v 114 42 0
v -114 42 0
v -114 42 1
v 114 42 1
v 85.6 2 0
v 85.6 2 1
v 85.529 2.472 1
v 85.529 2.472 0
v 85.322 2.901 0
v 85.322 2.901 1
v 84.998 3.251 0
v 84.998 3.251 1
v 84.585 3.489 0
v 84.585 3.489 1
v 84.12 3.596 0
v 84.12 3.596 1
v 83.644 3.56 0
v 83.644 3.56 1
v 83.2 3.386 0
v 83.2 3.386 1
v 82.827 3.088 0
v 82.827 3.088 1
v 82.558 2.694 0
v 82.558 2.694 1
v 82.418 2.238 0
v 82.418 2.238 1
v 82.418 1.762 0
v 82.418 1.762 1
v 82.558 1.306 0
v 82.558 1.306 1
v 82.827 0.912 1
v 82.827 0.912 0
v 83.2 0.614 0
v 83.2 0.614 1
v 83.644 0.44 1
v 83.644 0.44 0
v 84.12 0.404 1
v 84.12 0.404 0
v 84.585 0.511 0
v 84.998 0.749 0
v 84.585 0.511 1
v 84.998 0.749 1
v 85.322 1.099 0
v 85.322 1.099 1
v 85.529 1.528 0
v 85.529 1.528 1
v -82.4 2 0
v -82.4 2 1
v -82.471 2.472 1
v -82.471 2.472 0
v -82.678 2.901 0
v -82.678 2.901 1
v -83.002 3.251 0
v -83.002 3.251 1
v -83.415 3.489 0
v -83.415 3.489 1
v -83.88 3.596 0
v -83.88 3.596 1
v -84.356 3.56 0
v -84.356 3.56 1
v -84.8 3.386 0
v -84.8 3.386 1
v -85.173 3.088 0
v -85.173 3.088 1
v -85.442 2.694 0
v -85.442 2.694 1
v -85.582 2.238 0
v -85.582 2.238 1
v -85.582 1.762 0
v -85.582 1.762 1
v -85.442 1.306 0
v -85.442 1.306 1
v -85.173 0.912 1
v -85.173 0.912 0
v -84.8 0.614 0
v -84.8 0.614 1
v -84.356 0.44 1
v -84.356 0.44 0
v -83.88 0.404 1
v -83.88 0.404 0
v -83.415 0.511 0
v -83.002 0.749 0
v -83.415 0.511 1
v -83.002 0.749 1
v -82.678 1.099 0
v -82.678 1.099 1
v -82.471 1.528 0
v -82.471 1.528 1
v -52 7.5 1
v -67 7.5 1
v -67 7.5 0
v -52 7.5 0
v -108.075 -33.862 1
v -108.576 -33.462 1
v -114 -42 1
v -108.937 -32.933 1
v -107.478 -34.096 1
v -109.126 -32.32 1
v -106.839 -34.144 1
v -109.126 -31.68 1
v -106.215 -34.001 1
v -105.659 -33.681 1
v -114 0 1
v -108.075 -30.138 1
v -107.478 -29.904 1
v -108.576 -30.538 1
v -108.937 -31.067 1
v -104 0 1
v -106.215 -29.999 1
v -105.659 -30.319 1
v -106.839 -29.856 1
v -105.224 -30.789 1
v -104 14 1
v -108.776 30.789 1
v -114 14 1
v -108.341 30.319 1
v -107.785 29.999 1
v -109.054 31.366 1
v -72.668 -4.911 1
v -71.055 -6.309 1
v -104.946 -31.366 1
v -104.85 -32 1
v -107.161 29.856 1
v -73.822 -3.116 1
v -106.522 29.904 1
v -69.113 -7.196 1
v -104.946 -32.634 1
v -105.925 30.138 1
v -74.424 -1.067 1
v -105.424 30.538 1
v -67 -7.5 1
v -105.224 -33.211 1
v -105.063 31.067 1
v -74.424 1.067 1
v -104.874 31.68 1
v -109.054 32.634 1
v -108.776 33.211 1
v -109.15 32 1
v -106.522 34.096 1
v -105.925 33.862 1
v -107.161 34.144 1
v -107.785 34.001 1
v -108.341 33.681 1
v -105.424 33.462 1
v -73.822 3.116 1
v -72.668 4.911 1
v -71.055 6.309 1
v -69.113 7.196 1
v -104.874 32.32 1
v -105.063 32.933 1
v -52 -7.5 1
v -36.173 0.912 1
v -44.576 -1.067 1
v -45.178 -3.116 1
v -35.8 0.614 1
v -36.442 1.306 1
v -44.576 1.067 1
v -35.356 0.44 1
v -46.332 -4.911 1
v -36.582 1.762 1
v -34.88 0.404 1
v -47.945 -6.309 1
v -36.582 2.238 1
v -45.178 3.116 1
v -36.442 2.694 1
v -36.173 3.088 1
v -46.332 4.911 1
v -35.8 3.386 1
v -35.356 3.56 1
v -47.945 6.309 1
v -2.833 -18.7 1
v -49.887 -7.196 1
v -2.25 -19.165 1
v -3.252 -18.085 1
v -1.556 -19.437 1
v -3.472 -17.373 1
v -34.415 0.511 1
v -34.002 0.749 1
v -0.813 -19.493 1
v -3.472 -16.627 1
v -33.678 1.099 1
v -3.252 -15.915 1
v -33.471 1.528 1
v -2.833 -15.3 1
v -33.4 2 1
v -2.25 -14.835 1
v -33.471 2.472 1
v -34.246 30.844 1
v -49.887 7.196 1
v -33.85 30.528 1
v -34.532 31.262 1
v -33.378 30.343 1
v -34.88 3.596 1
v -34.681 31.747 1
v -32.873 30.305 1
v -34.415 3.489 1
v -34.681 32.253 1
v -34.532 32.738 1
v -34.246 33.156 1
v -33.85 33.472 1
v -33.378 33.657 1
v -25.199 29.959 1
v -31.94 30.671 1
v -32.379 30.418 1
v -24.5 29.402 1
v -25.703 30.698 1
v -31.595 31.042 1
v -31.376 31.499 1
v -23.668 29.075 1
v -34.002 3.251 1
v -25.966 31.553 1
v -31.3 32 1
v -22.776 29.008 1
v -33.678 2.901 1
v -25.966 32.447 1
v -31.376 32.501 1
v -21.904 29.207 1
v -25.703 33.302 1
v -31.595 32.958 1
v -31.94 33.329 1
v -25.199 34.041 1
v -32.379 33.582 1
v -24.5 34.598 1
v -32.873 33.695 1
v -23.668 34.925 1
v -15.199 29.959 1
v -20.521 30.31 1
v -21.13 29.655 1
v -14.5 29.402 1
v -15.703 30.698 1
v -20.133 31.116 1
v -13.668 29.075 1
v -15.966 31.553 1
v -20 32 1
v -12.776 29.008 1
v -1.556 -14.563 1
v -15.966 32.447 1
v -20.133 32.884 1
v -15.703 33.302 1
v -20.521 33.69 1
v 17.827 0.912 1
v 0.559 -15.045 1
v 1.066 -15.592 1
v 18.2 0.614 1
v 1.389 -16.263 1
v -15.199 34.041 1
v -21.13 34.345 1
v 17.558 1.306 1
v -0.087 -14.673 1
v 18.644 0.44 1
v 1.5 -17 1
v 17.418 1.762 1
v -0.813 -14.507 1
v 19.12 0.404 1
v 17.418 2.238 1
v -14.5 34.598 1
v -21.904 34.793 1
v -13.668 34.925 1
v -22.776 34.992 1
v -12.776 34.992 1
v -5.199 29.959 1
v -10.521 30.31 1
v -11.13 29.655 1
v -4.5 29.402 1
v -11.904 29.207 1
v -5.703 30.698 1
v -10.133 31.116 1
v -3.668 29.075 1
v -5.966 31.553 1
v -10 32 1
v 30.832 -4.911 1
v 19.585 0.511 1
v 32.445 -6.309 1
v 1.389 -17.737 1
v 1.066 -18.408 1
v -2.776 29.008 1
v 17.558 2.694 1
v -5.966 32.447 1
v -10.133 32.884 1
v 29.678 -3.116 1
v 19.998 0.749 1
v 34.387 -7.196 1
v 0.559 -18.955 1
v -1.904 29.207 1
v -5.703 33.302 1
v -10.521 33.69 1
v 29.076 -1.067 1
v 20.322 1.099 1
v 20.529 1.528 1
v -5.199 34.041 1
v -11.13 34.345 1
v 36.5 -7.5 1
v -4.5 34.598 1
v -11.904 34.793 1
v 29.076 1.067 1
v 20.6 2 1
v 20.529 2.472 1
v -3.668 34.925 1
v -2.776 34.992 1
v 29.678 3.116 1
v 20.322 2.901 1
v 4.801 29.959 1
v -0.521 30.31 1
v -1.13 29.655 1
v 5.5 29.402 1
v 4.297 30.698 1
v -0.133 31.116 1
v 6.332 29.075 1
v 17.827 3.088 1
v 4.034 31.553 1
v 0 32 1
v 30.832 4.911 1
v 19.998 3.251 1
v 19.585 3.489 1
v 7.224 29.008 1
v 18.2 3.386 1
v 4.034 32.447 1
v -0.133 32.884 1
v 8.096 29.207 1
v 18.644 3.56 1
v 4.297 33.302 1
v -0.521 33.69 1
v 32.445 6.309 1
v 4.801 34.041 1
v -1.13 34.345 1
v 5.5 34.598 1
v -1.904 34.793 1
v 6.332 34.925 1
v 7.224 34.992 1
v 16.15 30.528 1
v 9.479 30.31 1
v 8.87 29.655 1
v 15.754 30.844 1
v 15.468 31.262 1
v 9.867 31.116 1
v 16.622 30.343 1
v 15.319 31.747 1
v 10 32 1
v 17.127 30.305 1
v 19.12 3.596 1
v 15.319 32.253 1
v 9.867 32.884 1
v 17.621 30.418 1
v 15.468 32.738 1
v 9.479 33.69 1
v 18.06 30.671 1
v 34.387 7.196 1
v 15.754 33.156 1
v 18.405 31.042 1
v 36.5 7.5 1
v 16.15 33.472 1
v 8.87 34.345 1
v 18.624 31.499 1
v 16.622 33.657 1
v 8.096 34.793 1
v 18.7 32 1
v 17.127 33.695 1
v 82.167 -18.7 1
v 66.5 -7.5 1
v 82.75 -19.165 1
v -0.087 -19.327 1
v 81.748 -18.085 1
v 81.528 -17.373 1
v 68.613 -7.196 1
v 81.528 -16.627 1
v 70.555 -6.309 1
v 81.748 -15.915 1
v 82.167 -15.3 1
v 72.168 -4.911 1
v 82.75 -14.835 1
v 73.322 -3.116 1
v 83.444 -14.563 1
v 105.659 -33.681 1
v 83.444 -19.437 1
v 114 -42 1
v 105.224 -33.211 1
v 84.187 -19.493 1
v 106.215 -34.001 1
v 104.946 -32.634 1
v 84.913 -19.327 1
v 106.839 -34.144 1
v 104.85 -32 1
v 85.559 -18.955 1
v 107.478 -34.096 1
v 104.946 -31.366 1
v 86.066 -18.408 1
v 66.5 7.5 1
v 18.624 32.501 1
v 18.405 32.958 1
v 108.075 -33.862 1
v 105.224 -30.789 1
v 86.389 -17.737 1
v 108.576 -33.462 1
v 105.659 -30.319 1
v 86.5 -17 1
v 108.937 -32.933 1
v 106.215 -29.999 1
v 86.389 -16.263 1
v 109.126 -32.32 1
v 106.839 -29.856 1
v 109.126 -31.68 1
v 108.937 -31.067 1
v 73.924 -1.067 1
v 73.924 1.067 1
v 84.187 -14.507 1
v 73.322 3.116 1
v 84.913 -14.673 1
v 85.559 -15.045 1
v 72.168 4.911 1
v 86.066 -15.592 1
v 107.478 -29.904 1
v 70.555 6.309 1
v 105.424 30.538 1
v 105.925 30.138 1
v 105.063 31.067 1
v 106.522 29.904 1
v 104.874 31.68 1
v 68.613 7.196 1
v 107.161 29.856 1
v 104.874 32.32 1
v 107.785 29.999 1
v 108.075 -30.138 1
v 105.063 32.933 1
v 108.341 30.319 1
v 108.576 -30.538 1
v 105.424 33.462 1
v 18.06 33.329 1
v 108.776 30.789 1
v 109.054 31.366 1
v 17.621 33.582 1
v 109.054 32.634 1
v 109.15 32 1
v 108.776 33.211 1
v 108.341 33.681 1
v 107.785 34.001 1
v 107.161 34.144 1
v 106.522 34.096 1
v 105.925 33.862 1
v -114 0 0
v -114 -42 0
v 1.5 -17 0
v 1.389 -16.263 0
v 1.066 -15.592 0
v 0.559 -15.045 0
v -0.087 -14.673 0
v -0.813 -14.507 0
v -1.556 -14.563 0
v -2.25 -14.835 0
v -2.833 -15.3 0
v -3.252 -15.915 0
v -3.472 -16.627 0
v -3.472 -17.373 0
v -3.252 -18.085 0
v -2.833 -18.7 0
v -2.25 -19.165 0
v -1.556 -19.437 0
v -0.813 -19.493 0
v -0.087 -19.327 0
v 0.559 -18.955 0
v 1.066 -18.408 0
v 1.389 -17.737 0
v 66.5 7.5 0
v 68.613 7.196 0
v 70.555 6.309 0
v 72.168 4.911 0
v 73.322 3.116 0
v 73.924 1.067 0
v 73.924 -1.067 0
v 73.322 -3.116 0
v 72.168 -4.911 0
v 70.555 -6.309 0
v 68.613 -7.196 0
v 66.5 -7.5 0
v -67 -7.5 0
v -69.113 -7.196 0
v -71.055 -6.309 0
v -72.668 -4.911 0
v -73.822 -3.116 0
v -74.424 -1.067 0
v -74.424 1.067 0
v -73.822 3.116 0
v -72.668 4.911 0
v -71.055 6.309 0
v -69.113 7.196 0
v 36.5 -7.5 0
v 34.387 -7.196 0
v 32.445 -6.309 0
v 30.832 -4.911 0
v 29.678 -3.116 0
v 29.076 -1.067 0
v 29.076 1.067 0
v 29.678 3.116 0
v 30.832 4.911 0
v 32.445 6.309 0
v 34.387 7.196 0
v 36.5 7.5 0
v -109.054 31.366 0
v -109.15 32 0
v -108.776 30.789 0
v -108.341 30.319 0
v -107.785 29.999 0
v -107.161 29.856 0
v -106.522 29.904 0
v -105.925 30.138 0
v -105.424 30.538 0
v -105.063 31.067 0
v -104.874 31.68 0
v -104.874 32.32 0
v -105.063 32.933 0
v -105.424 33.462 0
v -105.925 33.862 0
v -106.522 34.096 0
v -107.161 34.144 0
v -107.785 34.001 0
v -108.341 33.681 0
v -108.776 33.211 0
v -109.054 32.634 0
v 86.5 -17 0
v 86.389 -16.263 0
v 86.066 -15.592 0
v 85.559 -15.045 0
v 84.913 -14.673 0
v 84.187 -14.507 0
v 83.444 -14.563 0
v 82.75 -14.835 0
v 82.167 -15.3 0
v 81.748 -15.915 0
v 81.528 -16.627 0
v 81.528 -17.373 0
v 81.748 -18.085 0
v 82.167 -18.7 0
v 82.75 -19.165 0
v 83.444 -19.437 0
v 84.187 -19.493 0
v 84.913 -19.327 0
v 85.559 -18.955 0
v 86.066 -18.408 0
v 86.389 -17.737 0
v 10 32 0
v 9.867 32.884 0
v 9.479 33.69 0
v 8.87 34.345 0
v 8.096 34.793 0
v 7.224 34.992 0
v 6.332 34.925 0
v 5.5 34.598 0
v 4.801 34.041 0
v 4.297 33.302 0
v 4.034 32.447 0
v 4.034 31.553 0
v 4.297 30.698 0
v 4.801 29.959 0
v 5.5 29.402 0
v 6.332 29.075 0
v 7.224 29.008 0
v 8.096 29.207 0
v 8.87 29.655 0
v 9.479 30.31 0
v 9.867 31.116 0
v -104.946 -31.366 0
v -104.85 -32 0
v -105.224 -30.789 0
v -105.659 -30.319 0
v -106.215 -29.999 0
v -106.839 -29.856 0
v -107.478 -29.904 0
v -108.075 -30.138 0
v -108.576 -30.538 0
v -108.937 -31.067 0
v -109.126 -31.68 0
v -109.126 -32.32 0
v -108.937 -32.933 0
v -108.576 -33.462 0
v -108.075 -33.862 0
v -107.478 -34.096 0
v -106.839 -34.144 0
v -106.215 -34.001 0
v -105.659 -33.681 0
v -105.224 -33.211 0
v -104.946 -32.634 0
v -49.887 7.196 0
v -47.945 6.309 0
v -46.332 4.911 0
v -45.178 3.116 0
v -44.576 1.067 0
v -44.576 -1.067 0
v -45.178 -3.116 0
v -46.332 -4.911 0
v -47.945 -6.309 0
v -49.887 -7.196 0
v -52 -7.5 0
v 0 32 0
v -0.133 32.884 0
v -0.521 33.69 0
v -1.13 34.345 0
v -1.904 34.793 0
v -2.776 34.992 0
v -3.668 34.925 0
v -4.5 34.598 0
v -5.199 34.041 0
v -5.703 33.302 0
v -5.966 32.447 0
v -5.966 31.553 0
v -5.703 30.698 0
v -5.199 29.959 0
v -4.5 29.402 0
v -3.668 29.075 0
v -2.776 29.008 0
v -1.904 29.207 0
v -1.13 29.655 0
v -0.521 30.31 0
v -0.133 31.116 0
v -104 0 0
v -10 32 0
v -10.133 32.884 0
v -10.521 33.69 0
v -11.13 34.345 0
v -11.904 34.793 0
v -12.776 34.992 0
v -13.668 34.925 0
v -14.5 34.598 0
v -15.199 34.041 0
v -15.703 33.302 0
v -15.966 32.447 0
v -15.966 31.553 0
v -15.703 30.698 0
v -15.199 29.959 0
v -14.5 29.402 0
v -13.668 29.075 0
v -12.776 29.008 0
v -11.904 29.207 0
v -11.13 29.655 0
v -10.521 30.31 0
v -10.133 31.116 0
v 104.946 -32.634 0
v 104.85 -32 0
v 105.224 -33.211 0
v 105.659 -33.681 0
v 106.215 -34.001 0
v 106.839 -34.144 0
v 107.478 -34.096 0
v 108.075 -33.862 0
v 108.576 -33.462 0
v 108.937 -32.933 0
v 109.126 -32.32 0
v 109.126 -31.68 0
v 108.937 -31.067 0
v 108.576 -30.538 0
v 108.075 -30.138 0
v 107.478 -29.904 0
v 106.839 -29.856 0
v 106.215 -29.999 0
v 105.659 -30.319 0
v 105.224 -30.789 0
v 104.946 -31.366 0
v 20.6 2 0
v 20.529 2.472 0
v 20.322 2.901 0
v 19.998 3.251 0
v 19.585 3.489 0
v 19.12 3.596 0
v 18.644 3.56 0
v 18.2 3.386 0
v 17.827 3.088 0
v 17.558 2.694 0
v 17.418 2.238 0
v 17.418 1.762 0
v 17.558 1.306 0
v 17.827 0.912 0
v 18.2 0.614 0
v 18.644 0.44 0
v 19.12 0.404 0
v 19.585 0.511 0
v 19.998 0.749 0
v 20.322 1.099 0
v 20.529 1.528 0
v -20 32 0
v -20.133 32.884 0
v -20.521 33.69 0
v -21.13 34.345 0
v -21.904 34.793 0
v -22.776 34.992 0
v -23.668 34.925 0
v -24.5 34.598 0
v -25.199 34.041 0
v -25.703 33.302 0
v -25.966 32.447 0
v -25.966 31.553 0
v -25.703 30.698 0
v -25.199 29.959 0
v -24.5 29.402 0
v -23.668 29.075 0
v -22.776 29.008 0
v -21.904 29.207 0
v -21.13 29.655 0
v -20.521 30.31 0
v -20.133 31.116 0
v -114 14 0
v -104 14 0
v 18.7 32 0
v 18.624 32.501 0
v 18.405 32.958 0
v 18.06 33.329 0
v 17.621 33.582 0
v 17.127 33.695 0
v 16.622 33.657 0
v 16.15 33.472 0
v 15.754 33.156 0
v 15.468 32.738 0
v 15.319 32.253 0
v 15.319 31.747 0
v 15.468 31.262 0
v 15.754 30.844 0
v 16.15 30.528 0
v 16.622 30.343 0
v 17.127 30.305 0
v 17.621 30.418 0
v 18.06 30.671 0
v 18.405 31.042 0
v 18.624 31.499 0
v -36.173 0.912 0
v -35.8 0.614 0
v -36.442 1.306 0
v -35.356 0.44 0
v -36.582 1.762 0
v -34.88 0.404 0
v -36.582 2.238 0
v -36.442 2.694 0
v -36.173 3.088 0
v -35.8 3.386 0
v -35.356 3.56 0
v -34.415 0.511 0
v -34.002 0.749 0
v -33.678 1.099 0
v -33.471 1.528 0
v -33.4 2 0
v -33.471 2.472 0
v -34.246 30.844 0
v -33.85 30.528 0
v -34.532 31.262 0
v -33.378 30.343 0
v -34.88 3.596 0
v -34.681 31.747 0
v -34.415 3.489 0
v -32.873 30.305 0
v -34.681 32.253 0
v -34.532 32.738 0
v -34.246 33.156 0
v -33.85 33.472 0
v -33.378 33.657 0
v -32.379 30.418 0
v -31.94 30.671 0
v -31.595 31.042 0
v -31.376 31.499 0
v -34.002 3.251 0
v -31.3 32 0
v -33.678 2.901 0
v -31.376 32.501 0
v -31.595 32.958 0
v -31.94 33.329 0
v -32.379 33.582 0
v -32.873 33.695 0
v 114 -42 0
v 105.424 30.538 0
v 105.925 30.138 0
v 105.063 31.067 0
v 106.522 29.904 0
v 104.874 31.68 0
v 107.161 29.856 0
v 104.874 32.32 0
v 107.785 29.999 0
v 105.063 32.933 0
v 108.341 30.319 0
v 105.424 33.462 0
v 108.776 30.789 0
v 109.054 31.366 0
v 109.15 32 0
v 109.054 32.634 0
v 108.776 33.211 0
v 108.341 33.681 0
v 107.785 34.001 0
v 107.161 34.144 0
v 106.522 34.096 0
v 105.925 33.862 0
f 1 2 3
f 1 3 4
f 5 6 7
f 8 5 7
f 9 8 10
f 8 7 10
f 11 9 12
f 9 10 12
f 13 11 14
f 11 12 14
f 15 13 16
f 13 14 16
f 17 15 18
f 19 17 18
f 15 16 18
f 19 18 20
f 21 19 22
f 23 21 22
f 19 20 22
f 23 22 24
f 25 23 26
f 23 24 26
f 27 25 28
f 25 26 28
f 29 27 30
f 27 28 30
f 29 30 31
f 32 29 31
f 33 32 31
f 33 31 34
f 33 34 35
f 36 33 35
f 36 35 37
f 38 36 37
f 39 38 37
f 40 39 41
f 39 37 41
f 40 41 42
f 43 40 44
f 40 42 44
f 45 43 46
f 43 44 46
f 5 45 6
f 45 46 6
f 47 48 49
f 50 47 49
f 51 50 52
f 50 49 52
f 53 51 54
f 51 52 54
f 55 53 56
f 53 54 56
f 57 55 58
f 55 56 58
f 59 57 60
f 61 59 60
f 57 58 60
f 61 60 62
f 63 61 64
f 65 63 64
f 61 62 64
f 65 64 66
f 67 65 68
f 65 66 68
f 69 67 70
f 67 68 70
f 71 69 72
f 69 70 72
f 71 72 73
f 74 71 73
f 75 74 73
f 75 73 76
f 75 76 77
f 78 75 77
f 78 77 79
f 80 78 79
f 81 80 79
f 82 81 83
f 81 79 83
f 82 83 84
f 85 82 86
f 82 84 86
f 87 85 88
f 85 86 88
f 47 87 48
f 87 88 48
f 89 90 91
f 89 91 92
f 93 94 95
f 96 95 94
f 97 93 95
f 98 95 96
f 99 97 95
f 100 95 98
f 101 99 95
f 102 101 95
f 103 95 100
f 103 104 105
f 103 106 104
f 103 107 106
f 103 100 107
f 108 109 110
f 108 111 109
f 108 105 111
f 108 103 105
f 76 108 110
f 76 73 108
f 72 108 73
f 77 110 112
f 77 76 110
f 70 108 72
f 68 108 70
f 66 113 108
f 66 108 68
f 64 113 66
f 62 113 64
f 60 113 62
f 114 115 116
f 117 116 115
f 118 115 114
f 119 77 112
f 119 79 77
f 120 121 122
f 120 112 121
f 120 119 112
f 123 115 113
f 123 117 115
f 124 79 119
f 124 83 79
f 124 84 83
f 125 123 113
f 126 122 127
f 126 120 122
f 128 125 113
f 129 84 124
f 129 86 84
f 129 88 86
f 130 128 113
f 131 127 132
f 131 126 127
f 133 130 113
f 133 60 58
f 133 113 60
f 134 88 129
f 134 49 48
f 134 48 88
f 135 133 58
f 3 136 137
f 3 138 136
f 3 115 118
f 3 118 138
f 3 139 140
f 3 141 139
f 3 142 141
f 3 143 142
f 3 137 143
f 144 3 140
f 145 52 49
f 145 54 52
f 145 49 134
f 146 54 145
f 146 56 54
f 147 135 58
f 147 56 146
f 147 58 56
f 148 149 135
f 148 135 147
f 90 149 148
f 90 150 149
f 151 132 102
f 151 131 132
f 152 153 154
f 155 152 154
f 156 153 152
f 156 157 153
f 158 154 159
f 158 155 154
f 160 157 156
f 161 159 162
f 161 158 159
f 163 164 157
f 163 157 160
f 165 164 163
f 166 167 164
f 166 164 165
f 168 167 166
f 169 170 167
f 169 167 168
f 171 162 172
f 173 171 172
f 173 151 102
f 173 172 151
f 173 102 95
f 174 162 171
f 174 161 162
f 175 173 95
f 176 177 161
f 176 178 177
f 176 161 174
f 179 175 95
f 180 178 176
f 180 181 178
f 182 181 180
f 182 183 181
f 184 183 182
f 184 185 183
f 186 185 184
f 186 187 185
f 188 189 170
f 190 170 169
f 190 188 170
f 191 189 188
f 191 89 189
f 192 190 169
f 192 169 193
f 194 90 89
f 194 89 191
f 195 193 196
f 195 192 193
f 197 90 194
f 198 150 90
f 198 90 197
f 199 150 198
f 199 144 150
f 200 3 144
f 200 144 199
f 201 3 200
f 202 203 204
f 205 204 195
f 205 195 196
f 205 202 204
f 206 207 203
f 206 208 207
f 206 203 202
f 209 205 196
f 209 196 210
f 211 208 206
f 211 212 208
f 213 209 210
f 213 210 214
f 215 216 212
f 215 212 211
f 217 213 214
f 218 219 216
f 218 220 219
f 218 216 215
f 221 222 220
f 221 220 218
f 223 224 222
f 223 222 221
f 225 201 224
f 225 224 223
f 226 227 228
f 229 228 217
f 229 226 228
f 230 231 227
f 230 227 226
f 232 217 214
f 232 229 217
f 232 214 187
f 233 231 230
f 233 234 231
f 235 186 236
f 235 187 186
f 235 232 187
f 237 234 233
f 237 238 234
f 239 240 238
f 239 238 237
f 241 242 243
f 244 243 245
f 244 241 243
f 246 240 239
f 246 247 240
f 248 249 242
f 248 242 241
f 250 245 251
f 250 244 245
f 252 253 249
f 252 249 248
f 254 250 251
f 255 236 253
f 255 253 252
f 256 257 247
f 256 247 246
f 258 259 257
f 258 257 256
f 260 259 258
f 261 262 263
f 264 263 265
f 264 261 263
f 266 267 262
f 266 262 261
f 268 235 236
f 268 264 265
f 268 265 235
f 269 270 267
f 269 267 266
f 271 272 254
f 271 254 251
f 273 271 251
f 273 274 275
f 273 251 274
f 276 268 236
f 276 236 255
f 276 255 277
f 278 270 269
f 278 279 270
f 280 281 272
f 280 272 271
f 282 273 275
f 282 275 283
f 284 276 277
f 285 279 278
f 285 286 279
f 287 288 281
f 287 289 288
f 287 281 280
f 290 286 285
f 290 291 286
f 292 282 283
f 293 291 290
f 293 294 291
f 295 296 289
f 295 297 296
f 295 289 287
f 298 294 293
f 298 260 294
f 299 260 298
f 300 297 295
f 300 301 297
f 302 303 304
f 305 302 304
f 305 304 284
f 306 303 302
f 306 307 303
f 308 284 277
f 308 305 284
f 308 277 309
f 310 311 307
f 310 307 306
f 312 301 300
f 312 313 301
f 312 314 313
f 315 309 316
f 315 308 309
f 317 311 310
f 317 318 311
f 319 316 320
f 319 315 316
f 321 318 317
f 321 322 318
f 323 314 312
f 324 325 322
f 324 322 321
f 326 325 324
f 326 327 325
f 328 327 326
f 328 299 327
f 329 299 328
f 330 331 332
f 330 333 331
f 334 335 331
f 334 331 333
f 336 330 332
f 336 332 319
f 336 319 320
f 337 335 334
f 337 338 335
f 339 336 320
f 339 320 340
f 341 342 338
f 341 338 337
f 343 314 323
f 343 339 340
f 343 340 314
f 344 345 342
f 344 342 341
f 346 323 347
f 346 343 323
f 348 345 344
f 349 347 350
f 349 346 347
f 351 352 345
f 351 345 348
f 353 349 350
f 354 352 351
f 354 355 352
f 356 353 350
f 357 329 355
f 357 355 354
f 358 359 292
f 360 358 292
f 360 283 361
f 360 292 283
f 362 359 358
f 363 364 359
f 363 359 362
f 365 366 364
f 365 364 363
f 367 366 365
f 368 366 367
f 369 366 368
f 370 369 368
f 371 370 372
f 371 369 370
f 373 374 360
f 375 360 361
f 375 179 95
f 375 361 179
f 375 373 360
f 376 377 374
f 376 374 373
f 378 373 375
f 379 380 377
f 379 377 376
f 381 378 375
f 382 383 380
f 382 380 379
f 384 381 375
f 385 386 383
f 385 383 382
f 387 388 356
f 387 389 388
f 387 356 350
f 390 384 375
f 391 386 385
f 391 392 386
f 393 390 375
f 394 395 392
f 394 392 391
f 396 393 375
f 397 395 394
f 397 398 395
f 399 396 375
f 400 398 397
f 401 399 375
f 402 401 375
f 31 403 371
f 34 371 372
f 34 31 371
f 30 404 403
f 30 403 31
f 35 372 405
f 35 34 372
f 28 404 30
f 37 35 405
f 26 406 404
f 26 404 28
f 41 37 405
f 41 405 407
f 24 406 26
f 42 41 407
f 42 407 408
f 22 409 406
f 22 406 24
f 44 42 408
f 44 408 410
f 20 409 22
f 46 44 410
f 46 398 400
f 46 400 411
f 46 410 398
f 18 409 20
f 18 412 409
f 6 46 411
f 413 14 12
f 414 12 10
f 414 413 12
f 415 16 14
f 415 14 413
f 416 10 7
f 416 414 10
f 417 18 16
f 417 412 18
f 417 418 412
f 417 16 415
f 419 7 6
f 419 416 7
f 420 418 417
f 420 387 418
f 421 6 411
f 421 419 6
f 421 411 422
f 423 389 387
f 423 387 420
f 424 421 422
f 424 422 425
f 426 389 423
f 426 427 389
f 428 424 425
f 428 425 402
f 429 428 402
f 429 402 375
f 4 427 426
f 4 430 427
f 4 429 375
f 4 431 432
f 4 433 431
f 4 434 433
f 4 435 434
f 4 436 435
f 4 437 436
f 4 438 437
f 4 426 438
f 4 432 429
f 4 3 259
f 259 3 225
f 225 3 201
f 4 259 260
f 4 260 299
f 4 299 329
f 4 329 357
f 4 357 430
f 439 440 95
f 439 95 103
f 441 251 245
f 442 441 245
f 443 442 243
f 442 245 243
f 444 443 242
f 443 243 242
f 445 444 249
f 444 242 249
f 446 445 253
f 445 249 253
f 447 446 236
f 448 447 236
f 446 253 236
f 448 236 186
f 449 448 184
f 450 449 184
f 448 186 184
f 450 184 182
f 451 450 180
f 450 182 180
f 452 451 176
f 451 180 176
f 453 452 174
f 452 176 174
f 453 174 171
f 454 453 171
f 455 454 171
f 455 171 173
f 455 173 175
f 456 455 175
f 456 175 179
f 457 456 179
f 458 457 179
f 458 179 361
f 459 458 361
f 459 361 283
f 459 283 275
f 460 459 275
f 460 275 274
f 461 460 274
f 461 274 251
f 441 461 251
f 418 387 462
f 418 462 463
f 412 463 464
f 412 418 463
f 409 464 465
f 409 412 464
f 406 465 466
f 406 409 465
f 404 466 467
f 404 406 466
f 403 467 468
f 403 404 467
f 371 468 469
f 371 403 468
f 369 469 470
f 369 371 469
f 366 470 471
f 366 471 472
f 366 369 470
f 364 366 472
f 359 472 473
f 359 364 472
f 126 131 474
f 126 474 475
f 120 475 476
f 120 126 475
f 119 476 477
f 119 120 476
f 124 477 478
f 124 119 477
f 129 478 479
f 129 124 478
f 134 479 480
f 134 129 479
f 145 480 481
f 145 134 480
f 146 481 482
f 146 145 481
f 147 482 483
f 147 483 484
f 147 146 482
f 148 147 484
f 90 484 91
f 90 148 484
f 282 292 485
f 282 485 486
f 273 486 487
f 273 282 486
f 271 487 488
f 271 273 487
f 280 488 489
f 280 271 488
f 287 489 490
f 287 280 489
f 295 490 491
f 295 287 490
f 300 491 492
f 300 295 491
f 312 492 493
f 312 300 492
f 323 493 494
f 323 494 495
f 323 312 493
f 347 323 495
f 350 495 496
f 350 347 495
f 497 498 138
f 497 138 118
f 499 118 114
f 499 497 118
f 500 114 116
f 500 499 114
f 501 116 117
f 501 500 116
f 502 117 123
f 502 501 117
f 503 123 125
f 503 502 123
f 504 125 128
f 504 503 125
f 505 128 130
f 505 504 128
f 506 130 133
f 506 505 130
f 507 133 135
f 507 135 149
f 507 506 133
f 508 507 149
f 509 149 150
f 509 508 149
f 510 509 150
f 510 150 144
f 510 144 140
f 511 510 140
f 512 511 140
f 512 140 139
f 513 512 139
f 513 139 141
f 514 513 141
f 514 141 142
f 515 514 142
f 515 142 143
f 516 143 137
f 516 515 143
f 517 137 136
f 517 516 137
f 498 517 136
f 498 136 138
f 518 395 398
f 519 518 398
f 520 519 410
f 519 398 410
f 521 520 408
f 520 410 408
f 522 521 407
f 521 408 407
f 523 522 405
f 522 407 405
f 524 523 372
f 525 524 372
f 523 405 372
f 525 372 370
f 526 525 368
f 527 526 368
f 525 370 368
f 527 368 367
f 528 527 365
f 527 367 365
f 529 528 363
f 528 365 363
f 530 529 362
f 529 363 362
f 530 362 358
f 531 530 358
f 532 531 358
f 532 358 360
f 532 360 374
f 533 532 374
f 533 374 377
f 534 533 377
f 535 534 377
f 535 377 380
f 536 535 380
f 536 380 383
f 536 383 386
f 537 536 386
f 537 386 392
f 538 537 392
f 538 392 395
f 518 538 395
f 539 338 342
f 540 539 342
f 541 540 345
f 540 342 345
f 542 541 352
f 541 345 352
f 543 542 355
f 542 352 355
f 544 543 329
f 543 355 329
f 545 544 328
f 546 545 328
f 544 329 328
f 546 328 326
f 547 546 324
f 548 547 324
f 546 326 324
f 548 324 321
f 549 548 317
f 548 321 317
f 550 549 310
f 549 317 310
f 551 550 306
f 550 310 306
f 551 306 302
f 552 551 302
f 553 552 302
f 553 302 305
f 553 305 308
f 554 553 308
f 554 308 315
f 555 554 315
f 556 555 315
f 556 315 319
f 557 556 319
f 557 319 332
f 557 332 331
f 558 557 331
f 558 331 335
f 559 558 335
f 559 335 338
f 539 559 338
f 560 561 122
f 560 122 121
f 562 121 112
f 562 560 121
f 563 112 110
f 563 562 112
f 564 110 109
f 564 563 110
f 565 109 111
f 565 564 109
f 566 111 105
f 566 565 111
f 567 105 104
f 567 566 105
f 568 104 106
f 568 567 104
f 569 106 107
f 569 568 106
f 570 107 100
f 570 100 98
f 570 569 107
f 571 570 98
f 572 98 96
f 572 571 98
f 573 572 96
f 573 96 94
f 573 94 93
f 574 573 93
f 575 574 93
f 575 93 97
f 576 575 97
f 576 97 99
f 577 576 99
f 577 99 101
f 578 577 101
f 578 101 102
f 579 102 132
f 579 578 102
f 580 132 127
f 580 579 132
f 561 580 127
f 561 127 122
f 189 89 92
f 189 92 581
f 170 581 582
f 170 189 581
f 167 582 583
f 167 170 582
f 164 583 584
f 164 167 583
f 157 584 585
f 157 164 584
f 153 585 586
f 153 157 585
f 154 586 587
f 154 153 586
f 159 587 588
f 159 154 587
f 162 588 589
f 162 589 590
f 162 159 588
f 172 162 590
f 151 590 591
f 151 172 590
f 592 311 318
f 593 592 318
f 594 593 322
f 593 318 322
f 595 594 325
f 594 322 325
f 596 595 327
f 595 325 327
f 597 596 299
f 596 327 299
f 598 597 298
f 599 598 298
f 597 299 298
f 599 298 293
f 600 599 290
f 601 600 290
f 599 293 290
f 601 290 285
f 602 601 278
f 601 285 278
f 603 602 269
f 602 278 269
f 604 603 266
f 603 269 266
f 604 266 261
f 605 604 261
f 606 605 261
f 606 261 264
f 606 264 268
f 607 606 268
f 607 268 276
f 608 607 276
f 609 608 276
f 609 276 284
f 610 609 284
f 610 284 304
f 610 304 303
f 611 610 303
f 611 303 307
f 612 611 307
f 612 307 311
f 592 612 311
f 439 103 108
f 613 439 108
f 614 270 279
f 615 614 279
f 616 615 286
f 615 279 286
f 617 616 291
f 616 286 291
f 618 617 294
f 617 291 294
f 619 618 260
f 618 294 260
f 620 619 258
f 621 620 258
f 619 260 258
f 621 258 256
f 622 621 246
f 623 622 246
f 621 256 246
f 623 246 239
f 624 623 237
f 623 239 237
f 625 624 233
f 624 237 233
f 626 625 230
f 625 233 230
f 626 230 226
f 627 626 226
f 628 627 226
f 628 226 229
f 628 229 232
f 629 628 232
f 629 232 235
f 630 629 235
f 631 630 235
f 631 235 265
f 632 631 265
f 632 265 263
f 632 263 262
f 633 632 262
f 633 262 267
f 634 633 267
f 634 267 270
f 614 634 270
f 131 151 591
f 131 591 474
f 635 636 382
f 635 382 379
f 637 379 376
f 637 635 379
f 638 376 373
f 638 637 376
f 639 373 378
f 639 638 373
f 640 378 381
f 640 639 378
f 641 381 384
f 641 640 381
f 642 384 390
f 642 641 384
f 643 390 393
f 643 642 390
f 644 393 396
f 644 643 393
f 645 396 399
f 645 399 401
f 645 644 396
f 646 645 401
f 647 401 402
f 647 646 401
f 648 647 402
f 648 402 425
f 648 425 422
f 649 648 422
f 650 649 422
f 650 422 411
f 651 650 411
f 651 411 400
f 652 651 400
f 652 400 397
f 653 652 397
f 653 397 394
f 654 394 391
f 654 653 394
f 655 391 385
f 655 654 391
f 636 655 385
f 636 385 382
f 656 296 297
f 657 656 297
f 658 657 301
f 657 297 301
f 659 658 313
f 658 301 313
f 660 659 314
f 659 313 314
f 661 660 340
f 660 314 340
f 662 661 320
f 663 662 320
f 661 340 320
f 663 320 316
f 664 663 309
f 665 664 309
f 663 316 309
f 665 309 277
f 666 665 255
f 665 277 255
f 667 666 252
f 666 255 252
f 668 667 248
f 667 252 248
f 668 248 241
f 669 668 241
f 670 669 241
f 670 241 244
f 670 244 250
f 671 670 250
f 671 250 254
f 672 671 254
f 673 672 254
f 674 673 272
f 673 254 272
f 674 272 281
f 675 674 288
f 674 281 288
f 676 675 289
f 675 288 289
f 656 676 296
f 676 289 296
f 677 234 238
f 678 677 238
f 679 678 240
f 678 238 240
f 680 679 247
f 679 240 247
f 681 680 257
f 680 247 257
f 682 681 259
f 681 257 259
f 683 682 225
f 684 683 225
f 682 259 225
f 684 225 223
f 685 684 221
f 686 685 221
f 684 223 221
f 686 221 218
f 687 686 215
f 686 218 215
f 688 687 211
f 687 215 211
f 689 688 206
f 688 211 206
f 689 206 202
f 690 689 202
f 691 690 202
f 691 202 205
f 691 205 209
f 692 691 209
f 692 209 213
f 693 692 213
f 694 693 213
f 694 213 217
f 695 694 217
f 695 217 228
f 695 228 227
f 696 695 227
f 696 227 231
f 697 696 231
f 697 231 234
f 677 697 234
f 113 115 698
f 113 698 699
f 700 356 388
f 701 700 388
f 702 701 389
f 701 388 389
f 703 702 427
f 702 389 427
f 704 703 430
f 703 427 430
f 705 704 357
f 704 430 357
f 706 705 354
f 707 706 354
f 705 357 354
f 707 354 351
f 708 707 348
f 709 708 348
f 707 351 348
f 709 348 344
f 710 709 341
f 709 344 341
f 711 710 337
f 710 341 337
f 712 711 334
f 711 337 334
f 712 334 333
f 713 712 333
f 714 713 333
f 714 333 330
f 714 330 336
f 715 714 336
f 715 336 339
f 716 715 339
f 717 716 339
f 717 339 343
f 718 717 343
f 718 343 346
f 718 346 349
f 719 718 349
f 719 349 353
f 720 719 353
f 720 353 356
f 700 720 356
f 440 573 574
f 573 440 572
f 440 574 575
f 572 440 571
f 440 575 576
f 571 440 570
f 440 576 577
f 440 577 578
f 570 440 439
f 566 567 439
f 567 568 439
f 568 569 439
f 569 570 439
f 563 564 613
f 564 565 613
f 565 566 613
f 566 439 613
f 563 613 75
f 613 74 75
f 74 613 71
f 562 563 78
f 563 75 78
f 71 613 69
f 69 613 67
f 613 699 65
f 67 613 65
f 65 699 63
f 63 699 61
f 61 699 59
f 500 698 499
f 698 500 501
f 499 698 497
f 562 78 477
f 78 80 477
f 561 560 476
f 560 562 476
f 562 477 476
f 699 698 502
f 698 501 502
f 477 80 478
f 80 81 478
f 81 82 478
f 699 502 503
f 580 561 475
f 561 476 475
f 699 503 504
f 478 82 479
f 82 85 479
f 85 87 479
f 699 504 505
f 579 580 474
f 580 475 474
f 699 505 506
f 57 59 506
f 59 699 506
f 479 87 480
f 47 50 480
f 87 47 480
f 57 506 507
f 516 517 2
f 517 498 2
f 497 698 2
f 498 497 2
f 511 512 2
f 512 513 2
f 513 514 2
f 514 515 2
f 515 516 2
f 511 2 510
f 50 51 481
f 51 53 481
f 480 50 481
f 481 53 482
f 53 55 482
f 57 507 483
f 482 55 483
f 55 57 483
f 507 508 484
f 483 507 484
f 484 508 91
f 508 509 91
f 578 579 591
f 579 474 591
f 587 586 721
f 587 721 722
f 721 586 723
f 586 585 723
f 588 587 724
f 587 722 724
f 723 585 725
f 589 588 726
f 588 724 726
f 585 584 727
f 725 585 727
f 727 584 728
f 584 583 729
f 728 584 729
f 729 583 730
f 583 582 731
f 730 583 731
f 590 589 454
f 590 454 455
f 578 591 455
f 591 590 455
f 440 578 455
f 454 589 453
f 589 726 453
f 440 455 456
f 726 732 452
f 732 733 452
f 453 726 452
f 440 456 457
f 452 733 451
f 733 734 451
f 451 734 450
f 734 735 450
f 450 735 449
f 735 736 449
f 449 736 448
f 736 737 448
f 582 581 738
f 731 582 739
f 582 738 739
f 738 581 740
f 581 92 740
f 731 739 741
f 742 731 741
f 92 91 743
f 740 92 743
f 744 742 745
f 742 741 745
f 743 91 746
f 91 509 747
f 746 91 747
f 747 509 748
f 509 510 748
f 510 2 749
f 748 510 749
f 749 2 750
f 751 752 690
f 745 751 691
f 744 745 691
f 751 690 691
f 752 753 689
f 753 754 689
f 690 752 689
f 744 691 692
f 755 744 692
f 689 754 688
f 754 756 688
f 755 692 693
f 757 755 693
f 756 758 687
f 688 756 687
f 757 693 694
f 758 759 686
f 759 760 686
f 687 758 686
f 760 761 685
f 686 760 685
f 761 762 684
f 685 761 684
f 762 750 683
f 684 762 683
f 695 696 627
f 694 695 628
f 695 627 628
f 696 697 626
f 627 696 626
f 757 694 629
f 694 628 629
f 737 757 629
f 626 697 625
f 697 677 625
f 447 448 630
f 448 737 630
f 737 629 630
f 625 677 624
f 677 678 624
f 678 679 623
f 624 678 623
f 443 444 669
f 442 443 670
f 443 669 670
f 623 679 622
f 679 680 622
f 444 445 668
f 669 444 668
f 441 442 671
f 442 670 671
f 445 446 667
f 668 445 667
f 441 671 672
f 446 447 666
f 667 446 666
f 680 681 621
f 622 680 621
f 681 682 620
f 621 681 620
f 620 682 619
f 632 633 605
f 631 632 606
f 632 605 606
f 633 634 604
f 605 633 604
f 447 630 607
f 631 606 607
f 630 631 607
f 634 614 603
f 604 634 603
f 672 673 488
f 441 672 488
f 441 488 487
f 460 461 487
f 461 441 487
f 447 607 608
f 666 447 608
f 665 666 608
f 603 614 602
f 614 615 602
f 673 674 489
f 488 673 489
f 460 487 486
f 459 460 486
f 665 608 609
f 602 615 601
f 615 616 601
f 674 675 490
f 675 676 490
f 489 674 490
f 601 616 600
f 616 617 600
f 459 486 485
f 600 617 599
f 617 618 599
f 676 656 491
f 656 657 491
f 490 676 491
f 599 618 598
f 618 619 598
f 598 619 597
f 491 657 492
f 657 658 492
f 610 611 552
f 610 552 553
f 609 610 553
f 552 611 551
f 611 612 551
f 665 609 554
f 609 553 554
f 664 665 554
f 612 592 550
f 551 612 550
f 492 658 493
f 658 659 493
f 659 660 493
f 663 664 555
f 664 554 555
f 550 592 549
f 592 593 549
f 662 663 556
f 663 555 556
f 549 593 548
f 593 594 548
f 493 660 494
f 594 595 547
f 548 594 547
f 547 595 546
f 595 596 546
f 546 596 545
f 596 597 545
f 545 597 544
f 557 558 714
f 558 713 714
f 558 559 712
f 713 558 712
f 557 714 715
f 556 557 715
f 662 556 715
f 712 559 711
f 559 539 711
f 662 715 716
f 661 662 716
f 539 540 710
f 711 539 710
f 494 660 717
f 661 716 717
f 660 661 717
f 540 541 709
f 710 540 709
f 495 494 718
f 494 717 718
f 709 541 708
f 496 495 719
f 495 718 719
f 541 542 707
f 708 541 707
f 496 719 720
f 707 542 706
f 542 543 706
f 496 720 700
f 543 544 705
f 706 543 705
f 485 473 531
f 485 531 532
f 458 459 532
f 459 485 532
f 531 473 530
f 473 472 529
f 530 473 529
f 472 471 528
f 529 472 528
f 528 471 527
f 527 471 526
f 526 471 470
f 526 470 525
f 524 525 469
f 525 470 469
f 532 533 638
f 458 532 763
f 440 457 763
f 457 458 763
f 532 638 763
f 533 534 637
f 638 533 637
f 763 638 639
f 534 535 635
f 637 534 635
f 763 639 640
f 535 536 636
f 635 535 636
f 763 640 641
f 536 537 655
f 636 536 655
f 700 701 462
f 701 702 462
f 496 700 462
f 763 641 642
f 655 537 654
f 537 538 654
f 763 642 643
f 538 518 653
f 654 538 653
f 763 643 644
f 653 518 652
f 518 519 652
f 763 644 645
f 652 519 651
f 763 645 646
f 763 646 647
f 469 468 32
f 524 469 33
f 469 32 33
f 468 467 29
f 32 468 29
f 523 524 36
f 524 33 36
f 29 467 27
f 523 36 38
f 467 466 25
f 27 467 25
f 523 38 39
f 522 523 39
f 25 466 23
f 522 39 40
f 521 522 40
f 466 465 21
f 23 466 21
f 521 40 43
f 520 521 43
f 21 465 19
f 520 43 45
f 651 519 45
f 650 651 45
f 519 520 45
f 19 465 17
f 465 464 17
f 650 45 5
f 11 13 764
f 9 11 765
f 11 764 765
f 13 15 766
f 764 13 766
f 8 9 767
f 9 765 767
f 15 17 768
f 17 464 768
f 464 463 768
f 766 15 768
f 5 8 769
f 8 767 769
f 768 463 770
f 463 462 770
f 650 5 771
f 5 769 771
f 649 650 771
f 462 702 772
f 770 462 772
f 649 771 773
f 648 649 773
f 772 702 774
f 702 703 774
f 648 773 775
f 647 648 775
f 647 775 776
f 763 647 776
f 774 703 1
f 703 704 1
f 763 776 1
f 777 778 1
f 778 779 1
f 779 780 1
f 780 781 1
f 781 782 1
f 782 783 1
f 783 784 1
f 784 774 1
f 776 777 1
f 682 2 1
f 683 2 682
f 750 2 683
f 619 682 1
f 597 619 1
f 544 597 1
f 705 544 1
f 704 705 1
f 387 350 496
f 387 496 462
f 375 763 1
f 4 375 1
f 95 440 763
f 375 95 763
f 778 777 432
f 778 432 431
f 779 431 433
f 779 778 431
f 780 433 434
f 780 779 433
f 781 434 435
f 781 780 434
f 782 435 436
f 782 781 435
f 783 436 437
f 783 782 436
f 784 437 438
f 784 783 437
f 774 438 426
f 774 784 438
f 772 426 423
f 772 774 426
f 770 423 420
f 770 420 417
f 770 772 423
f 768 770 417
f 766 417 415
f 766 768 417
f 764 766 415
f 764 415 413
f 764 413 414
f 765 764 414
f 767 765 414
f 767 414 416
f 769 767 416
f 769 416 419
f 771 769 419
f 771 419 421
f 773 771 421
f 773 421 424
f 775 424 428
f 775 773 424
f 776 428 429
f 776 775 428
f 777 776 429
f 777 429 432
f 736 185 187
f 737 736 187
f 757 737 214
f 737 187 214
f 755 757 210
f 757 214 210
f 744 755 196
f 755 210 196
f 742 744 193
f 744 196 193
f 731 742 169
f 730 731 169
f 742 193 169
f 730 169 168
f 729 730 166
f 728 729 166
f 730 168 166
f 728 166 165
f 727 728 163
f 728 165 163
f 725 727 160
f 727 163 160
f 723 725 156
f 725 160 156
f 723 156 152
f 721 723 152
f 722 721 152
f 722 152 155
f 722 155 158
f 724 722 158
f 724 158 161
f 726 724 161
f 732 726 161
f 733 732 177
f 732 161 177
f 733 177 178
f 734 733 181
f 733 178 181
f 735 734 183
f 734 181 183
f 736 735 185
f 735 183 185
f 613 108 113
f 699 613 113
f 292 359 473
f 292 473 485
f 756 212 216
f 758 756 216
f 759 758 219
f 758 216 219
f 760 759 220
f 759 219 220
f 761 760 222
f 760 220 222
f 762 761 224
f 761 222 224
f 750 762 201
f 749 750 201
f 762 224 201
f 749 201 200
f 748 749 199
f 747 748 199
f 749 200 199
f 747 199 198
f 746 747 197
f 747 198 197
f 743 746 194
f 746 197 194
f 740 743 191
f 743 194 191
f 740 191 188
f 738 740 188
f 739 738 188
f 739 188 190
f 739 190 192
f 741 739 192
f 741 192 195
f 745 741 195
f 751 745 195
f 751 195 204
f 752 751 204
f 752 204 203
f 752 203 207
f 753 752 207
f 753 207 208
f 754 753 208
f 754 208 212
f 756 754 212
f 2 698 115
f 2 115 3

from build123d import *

# Parameters (mm, degrees)
SKETCH_1_W          = 228
SKETCH_1_H          = 84
SKETCH_1_R          = 2.15
EXTRUDE_1_DEPTH     = 1
SKETCH_4_R          = 1.6
SKETCH_4_W          = 14.464145402
SKETCH_4_H          = 14
CUT_EXTRUDE_2_DEPTH = 1
SKETCH_5_R          = 1.7
SKETCH_5_R_2        = 3
SKETCH_5_R_3        = 2.5
CUT_EXTRUDE_3_DEPTH = 10


with BuildPart() as part:
    # Эскиз1 → Вытянуть1 (new body)
    with BuildSketch(Plane.XY):
        Rectangle(SKETCH_1_W, SKETCH_1_H)
        with Locations((107, 32)):
            Circle(SKETCH_1_R, mode=Mode.SUBTRACT)
        with Locations(Location((-107, 32, 0), (0, 0, 180))):
            Circle(SKETCH_1_R, mode=Mode.SUBTRACT)
        with Locations((-107, -32)):
            Circle(SKETCH_1_R, mode=Mode.SUBTRACT)
        with Locations(Location((107, -32, 0), (0, 0, 180))):
            Circle(SKETCH_1_R, mode=Mode.SUBTRACT)
    extrude(amount=EXTRUDE_1_DEPTH)

    # Эскиз4 → Вырез-Вытянуть2 (cut)
    with BuildSketch(Plane.XY.offset(1)):
        with Locations((19, 2)):
            Circle(SKETCH_4_R)
        with Locations((84, 2)):
            Circle(SKETCH_4_R)
        with Locations((-84, 2)):
            Circle(SKETCH_4_R)
        with Locations((-35, 2)):
            Circle(SKETCH_4_R)
        with BuildLine():
            Line((36.5, 7.5), (66.5, 7.5))
            ThreePointArc((66.5, 7.5), (74, 0), (66.5, -7.5))
            Line((66.5, -7.5), (36.5, -7.5))
            ThreePointArc((36.5, -7.5), (29, 0), (36.5, 7.5))
        make_face()
        with BuildLine():
            Line((-67, 7.5), (-52, 7.5))
            ThreePointArc((-52, 7.5), (-44.5, 0), (-52, -7.5))
            Line((-52, -7.5), (-67, -7.5))
            ThreePointArc((-67, -7.5), (-74.5, 0), (-67, 7.5))
        make_face()
        with Locations((-111.232072701, 7)):
            Rectangle(SKETCH_4_W, SKETCH_4_H)
    extrude(amount=-CUT_EXTRUDE_2_DEPTH, mode=Mode.SUBTRACT)

    # Эскиз5 → Вырез-Вытянуть3 (cut)
    with BuildSketch(Plane.XY.offset(1)):
        with Locations((-33, 32)):
            Circle(SKETCH_5_R)
        with Locations((17, 32)):
            Circle(SKETCH_5_R)
        with Locations((7, 32)):
            Circle(SKETCH_5_R_2)
        with Locations((-3, 32)):
            Circle(SKETCH_5_R_2)
        with Locations((-13, 32)):
            Circle(SKETCH_5_R_2)
        with Locations((-23, 32)):
            Circle(SKETCH_5_R_2)
        with Locations((-1, -17)):
            Circle(SKETCH_5_R_3)
        with Locations((84, -17)):
            Circle(SKETCH_5_R_3)
    extrude(amount=-CUT_EXTRUDE_3_DEPTH, mode=Mode.SUBTRACT)


solid = part.part
